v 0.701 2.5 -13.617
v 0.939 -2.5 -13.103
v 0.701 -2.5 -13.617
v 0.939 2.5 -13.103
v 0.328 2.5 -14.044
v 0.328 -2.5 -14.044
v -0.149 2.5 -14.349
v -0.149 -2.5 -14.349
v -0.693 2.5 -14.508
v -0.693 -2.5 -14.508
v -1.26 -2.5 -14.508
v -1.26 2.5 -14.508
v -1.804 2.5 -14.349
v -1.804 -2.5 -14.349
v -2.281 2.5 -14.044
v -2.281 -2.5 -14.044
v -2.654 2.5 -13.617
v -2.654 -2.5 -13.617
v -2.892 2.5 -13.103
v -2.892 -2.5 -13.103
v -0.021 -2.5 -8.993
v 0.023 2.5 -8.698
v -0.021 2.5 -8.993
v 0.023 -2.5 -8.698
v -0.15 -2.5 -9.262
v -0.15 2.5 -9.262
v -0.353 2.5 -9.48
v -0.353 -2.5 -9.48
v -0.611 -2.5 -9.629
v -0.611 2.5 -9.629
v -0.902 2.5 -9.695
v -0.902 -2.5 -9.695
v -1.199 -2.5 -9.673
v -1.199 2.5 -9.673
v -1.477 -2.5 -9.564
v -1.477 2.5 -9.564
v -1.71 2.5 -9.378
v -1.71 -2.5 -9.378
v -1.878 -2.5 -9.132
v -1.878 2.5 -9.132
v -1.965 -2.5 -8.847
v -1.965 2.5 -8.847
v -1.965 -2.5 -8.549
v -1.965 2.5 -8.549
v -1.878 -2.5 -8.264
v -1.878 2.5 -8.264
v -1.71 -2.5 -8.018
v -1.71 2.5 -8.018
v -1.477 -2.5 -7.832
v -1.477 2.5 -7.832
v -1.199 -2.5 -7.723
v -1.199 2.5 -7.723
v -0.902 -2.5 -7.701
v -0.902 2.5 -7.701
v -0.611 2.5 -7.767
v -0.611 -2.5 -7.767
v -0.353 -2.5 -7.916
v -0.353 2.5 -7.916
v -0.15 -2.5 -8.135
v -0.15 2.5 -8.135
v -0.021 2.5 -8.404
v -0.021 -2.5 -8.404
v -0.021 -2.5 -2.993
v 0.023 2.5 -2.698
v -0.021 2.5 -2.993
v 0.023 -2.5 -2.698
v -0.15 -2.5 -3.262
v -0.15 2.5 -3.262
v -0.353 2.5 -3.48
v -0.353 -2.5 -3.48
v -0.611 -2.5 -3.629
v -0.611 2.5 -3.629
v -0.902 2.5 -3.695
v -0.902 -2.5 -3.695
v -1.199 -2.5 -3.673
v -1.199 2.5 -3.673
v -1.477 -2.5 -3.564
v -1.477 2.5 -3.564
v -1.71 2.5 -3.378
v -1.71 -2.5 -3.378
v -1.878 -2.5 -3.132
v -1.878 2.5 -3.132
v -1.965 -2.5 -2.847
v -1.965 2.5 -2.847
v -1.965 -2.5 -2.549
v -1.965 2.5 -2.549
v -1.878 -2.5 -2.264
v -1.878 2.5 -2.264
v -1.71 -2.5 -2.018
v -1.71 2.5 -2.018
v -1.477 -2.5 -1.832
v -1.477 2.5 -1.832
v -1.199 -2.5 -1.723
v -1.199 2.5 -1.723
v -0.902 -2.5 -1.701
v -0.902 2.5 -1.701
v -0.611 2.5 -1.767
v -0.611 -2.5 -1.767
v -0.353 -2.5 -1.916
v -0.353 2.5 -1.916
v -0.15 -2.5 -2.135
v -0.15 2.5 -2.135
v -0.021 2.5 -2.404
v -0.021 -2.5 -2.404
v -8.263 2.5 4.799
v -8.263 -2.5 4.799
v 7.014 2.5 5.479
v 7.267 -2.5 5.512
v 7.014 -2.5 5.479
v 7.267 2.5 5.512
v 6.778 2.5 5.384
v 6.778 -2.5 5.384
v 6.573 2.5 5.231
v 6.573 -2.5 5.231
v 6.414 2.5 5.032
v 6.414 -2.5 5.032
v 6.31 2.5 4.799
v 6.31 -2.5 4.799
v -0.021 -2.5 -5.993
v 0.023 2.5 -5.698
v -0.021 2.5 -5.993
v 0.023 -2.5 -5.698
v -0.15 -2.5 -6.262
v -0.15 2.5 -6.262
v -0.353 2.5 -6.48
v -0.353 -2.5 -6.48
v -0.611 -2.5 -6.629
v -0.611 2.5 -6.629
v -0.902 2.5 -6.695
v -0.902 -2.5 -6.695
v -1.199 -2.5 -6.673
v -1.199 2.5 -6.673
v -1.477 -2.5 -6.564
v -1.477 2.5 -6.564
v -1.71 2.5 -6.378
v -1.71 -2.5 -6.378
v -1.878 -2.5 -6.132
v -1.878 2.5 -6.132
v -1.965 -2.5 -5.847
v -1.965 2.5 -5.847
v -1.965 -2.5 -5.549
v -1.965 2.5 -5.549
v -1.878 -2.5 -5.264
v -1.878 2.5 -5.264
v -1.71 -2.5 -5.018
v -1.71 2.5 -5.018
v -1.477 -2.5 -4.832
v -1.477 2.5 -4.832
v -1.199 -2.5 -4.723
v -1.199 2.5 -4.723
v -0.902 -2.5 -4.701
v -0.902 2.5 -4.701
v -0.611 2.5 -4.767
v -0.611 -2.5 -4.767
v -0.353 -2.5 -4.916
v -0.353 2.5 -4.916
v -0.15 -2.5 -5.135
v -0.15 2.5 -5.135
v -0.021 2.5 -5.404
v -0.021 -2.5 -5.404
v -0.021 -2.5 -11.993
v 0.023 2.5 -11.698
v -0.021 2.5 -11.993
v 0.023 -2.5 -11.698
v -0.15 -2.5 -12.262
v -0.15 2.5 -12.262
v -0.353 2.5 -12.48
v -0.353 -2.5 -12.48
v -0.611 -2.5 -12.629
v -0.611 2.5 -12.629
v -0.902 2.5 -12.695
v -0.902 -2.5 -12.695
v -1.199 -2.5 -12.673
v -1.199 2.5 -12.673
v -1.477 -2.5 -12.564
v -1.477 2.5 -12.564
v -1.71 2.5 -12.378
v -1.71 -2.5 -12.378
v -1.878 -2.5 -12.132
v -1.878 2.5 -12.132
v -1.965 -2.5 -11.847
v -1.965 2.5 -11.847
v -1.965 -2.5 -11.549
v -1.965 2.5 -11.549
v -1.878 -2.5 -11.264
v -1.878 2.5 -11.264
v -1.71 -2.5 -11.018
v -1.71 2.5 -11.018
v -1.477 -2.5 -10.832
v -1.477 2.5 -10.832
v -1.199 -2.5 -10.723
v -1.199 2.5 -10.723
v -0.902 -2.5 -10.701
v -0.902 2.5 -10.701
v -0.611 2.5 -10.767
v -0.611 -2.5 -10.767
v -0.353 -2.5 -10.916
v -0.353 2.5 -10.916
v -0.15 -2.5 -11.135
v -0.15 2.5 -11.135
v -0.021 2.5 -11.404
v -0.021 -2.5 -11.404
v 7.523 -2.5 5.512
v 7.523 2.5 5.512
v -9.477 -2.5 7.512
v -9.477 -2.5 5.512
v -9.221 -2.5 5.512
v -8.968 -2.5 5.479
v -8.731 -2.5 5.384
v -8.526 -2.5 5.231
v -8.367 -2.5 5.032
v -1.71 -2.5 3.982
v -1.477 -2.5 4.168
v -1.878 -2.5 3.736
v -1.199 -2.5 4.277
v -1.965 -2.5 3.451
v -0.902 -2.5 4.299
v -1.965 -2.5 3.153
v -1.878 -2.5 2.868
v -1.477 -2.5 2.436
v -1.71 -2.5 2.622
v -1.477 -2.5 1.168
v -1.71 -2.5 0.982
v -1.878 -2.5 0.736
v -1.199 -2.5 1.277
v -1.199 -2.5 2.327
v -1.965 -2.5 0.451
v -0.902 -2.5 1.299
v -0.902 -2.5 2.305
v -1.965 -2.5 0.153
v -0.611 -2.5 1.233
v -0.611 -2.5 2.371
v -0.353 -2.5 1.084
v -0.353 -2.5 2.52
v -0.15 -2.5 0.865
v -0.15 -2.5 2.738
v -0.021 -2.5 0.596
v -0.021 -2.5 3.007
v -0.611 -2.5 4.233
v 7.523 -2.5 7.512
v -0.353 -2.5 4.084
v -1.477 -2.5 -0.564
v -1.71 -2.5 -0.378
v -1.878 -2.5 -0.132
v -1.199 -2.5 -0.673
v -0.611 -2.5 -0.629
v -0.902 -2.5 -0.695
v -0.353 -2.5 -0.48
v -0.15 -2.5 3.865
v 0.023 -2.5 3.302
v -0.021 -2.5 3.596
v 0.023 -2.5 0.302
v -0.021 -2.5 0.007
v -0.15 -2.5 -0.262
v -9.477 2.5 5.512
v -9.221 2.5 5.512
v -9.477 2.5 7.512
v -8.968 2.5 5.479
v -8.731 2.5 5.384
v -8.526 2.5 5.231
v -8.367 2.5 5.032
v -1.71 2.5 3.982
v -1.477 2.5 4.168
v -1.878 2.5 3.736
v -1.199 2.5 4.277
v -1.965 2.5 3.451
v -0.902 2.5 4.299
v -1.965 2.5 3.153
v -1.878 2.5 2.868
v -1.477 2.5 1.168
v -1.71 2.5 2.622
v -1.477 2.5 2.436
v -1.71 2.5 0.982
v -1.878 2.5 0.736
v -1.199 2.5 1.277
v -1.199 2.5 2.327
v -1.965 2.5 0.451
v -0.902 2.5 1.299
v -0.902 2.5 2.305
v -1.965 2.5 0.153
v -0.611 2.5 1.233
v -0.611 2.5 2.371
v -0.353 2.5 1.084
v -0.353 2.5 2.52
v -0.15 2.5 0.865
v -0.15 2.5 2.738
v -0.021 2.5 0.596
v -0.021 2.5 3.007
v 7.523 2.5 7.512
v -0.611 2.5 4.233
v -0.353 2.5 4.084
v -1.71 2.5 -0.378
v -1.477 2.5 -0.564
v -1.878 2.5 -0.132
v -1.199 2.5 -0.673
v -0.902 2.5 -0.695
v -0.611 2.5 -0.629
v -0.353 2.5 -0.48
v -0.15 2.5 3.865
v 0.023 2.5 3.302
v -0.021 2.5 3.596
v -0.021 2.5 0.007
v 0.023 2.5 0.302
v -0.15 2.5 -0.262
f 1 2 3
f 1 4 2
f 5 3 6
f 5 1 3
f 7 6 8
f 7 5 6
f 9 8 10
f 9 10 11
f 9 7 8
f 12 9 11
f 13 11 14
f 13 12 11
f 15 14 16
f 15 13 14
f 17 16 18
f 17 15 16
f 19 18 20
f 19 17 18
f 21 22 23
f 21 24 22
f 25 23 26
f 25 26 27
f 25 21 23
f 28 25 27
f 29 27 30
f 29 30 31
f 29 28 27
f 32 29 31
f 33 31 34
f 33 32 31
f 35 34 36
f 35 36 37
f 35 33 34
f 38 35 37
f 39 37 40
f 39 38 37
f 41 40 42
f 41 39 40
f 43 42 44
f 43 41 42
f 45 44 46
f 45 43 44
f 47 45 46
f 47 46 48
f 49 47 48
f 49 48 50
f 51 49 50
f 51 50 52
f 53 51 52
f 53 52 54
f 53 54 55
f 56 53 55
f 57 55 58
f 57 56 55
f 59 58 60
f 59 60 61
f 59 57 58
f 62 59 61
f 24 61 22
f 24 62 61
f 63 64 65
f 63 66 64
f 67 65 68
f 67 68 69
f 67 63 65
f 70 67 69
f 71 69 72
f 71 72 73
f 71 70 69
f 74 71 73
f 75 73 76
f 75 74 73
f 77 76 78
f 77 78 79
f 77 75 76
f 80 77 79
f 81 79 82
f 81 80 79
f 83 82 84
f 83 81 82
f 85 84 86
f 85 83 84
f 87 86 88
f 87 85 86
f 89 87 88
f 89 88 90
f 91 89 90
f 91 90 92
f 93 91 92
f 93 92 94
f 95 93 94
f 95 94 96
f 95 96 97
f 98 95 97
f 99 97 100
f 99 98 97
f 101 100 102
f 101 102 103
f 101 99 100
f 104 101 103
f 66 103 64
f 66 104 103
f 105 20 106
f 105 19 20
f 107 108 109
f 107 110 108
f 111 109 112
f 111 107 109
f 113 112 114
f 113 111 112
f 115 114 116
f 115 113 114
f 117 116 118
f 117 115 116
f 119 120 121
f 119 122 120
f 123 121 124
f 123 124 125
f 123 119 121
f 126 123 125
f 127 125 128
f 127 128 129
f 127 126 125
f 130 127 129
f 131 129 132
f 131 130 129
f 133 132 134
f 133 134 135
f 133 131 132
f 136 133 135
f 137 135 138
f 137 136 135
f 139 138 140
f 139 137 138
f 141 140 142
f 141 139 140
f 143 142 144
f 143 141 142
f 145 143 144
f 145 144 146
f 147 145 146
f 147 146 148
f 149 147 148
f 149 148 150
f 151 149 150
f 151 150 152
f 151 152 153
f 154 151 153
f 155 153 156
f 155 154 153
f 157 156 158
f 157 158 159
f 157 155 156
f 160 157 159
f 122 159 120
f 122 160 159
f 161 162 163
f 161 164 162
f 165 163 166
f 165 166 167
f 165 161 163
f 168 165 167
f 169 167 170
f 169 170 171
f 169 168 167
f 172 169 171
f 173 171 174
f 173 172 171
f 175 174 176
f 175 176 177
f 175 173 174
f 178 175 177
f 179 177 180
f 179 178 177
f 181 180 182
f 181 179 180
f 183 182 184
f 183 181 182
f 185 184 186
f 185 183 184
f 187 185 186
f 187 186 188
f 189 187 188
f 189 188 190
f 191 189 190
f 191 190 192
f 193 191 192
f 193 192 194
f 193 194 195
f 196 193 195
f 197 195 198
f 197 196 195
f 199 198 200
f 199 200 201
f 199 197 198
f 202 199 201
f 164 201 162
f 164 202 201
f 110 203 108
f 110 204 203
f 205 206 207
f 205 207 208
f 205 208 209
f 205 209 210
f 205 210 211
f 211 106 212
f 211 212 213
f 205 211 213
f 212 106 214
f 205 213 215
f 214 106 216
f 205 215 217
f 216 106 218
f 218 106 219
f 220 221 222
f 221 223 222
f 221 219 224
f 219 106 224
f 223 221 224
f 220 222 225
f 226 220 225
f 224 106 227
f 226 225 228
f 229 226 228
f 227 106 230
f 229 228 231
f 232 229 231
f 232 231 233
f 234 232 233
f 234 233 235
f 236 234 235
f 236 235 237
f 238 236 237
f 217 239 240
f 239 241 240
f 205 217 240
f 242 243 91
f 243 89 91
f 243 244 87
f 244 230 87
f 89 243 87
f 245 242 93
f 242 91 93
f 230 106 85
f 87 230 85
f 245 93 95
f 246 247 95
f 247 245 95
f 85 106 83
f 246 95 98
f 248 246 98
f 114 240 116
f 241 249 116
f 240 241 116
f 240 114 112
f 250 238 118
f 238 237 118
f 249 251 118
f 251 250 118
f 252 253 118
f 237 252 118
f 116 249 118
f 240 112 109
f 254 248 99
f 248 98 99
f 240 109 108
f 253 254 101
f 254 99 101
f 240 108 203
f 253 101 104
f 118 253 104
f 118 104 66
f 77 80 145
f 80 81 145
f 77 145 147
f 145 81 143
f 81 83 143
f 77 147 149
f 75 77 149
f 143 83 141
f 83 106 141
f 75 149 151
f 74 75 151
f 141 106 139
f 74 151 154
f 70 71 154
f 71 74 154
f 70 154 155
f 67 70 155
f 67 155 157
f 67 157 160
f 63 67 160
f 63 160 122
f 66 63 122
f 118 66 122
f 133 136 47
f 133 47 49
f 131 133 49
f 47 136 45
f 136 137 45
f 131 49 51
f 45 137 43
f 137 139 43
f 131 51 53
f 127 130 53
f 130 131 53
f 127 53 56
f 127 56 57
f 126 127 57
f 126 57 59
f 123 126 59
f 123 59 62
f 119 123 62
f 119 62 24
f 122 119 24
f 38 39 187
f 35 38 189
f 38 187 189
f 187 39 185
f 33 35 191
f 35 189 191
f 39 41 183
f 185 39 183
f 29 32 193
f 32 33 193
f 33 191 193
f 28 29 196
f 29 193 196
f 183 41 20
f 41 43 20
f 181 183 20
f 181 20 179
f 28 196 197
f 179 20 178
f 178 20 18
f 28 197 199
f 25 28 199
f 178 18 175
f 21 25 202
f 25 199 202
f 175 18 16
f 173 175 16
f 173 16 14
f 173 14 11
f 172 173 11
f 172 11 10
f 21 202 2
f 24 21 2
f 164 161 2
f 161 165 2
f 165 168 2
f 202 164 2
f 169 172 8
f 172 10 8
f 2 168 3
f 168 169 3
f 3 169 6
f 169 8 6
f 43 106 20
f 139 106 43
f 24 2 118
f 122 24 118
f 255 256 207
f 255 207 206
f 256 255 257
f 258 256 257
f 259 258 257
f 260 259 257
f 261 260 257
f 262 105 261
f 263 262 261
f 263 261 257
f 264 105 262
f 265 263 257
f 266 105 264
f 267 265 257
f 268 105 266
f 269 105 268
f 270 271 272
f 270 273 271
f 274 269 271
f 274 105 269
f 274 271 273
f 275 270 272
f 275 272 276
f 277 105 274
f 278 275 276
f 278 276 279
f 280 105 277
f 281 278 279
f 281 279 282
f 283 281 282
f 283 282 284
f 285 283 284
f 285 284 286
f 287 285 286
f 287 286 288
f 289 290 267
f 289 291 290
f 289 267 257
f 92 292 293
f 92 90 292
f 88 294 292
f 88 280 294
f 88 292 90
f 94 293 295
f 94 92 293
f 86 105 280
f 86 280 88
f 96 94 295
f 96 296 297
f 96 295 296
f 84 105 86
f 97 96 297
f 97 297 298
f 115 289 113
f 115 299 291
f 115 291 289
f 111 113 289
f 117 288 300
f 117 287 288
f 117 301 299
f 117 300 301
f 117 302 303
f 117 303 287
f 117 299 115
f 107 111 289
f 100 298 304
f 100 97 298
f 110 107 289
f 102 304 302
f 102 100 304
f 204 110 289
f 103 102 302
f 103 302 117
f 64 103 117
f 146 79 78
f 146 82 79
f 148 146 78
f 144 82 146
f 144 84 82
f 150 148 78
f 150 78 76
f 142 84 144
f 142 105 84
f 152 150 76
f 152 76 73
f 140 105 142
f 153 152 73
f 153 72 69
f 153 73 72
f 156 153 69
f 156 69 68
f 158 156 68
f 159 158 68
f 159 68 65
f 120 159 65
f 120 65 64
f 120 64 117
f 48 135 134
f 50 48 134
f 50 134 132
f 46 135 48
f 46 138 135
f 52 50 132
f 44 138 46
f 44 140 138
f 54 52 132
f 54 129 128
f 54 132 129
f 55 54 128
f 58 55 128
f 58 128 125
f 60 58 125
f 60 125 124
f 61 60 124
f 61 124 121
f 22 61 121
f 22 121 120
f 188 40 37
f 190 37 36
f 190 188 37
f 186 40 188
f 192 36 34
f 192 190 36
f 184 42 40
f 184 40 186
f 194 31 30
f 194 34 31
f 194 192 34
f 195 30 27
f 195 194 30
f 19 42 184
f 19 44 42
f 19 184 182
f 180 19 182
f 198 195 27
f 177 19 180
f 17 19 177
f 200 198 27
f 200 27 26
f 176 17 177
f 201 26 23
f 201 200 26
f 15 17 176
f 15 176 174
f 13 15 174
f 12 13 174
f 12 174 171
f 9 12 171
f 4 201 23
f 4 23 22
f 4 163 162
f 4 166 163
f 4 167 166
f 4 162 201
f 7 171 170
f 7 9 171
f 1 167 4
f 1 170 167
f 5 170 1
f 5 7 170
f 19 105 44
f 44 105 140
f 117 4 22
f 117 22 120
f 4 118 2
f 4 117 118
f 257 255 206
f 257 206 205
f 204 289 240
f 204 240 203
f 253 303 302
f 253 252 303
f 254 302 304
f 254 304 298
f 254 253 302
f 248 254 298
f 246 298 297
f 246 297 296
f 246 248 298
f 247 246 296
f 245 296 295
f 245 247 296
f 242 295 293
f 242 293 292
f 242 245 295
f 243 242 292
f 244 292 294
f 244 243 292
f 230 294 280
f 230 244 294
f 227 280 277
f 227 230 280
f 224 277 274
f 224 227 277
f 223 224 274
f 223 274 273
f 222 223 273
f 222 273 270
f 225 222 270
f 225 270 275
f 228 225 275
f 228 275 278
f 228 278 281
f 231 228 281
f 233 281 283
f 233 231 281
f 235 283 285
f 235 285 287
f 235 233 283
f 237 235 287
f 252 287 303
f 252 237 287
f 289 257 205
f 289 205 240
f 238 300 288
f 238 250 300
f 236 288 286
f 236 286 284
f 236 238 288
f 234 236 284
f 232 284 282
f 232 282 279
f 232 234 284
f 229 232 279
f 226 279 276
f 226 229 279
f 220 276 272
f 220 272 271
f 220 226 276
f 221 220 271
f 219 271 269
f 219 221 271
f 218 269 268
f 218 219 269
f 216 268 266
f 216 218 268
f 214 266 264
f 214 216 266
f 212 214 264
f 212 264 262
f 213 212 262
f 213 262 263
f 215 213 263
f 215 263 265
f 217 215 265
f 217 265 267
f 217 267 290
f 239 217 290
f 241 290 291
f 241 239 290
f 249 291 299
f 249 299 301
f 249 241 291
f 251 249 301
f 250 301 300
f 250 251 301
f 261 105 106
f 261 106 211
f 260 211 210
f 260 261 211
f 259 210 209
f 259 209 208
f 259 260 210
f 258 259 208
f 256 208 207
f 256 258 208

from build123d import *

# Parameters (mm, degrees)
SKETCH1_R           = 1
BOSS_EXTRUDE1_DEPTH = 2.5


with BuildPart() as part:
    # Sketch1 → Boss-Extrude1 (new body, symmetric)
    with BuildSketch(Plane(origin=(0, 0, 0), x_dir=(1, 0, 0), z_dir=(0, 1, 0))):
        with BuildLine():
            Line((-2.892231872, 13.10273237), (-8.262783668, -4.799106947))
            ThreePointArc((-8.262783668, -4.799106947), (-8.623679423, -5.31405199), (-9.220609953, -5.511759062))
            Line((-9.220609953, -5.511759062), (-9.476579302, -5.511759062))
            Line((-9.476579302, -5.511759062), (-9.476579302, -7.511759062))
            Line((-9.476579302, -7.511759062), (7.523420698, -7.511759062))
            Line((7.523420698, -7.511759062), (7.523420698, -5.511759062))
            Line((7.523420698, -5.511759062), (7.267451349, -5.511759062))
            ThreePointArc((7.267451349, -5.511759062), (6.670520819, -5.31405199), (6.309625064, -4.799106947))
            Line((6.309625064, -4.799106947), (0.939073269, 13.10273237))
            ThreePointArc((0.939073269, 13.10273237), (-0.976579302, 14.528036599), (-2.892231872, 13.10273237))
        make_face()
        with Locations((-0.976579302, -3.301730431)):
            Circle(SKETCH1_R, mode=Mode.SUBTRACT)
        with Locations((-0.976579302, -0.301730431)):
            Circle(SKETCH1_R, mode=Mode.SUBTRACT)
        with Locations((-0.976579302, 2.698269569)):
            Circle(SKETCH1_R, mode=Mode.SUBTRACT)
        with Locations((-0.976579302, 8.698269569)):
            Circle(SKETCH1_R, mode=Mode.SUBTRACT)
        with Locations((-0.976579302, 11.698269569)):
            Circle(SKETCH1_R, mode=Mode.SUBTRACT)
        with Locations((-0.976579302, 5.698269569)):
            Circle(SKETCH1_R, mode=Mode.SUBTRACT)
    extrude(amount=BOSS_EXTRUDE1_DEPTH, both=True)


solid = part.part
